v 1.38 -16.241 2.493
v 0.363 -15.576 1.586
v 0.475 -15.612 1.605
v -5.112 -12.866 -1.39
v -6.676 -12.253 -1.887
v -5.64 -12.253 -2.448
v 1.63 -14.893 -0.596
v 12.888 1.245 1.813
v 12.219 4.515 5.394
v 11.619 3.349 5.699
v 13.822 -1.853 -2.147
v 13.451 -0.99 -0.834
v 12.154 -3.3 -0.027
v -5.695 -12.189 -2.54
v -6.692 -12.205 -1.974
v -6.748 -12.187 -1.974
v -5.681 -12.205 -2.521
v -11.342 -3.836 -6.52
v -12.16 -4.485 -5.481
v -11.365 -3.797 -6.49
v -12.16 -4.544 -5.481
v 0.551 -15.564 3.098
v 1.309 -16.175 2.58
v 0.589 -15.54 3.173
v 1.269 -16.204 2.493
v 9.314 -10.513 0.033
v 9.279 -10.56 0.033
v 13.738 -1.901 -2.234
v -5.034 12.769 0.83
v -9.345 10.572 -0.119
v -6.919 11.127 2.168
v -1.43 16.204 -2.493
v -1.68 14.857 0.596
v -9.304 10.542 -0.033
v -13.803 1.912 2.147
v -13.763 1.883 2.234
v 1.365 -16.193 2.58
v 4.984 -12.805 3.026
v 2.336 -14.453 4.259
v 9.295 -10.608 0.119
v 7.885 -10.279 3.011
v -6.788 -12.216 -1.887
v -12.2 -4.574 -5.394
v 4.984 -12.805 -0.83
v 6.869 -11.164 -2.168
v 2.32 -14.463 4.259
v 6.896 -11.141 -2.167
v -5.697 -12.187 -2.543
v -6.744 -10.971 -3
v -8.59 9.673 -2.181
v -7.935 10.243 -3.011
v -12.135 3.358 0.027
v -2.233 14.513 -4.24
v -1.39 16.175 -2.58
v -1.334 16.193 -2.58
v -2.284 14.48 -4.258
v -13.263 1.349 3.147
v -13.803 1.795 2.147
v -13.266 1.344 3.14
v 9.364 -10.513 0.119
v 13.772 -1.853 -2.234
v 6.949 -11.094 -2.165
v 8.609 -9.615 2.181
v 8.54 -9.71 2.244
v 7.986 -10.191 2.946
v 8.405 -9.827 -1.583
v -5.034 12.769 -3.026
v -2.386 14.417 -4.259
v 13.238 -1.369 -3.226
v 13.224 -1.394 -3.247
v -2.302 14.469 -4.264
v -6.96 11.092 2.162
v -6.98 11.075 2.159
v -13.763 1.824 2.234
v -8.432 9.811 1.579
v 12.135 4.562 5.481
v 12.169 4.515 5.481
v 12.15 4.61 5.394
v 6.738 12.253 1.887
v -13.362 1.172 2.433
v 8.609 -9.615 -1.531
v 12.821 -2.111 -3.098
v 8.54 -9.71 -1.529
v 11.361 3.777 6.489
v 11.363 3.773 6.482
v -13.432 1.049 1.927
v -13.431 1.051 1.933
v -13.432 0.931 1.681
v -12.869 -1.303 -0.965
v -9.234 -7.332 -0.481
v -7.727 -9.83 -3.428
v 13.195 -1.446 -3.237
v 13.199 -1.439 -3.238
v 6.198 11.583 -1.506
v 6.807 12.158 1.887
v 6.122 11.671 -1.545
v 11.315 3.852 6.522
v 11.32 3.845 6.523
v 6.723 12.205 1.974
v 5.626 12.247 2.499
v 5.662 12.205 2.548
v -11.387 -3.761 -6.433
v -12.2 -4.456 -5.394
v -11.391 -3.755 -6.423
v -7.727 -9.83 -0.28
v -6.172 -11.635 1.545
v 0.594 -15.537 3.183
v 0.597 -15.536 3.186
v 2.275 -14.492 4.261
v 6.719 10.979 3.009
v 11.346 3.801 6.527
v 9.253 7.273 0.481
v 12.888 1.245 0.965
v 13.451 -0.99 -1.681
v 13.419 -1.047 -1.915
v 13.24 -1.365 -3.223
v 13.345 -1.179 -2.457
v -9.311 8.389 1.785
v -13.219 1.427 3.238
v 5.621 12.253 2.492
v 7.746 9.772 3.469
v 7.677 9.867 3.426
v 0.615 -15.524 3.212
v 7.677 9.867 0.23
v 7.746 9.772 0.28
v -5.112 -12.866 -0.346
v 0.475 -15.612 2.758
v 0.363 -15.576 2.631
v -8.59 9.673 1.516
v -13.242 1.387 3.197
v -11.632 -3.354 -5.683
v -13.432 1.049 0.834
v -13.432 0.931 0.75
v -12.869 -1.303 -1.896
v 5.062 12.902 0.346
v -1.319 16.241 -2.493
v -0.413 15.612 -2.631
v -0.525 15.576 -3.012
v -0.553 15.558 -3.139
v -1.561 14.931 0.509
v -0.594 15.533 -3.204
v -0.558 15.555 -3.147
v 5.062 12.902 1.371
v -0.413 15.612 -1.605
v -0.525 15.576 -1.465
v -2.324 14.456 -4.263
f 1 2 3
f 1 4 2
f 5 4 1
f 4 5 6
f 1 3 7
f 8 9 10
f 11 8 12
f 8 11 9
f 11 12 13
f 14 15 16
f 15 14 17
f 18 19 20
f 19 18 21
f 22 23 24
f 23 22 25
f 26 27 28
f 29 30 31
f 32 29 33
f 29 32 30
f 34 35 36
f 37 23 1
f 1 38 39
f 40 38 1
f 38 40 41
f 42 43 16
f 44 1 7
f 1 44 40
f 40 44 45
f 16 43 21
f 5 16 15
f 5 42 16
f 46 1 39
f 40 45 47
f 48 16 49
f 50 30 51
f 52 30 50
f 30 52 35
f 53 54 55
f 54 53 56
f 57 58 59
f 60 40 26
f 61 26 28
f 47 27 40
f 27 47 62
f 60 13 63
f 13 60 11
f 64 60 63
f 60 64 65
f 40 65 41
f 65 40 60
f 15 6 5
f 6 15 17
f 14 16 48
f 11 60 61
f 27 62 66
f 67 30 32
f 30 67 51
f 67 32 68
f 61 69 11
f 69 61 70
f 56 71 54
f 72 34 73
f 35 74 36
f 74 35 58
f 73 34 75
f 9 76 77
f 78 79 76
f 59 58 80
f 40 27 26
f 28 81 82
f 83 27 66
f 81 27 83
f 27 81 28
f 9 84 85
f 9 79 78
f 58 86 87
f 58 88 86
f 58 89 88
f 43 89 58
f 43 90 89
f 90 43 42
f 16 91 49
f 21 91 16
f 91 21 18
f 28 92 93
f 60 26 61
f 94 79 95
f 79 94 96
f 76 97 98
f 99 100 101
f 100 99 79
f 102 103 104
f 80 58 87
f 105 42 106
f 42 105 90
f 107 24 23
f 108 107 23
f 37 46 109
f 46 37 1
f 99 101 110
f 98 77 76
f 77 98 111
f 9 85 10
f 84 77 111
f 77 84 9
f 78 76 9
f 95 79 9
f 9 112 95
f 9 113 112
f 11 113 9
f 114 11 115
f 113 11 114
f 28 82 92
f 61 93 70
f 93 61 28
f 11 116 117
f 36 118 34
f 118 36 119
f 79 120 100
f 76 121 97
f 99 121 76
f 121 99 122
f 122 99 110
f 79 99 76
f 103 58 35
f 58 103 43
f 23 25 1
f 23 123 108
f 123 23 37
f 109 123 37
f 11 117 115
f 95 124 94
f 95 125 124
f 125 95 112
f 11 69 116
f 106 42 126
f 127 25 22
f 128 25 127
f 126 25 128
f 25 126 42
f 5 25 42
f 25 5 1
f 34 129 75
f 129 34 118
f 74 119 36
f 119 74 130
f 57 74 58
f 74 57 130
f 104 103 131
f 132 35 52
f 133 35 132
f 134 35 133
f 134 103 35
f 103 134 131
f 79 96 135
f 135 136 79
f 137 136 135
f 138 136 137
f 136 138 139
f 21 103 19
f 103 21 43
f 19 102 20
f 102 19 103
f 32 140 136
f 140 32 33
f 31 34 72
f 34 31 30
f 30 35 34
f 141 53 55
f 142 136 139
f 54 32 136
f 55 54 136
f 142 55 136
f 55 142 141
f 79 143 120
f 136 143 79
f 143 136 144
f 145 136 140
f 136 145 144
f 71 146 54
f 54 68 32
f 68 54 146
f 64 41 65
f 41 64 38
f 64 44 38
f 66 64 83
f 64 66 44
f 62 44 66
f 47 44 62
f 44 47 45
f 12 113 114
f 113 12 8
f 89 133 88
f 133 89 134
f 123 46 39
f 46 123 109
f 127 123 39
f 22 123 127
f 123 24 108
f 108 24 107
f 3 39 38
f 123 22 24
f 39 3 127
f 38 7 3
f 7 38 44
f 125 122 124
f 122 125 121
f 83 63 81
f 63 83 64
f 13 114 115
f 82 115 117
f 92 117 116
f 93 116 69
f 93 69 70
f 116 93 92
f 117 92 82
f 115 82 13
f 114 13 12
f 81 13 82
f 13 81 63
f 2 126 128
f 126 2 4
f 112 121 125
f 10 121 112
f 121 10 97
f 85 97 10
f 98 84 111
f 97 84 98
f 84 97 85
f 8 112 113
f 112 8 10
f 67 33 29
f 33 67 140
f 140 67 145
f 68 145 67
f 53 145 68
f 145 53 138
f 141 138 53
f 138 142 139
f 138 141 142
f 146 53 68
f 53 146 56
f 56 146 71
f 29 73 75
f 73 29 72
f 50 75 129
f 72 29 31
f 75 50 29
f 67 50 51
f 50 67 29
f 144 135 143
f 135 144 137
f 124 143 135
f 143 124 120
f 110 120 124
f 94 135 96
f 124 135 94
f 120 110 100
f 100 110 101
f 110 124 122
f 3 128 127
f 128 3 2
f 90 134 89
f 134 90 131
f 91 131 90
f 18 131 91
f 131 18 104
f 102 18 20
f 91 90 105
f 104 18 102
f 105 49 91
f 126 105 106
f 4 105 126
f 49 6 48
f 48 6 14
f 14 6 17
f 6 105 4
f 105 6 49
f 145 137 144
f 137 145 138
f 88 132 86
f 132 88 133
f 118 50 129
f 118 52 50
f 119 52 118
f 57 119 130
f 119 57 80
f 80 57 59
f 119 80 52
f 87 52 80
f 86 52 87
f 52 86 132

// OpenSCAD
// Auto-generated OpenSCAD file

    inner_points = 10*[[-1.3350698747901557, 0.0990218864340161, -0.41389441527673243], [0.8508637948042702, -0.9614534950051333, 0.5613942208431721], [-0.8508637948042702, 0.9614534950051333, -0.5613942208431721], [1.3350698747901557, -0.0990218864340161, 0.41389441527673243], [-0.07512626496626917, -0.194799963559733, -1.385617014211274], [0.7598260996660189, -0.5998655150369786, -1.013089904054999], [-0.7598260996660189, 0.5998655150369786, 1.013089904054999], [0.07512626496626917, 0.194799963559733, 1.385617014211274], [-0.5030679550992645, -1.280705233674586, -0.26503250471063], [0.7646000198631342, 0.9771700305368443, -0.6511920090175702], [-0.7646000198631342, -0.9771700305368443, 0.6511920090175702], [0.5030679550992645, 1.280705233674586, 0.26503250471063], [-0.8556377150013853, -0.6155820505686895, -0.9232921158806008], [0.4953435899607525, -1.2709918805305933, -0.3205305899169714], [-0.07217582002487244, 0.7798616050716232, -1.1619518146211012], [1.2788054849372654, 0.12445177510971961, -0.5591902886574719], [-1.2788054849372654, -0.12445177510971961, 0.5591902886574719], [0.07217582002487244, -0.7798616050716232, 1.1619518146211012], [-0.4953435899607525, 1.2709918805305933, 0.3205305899169714], [0.8556377150013853, 0.6155820505686895, 0.9232921158806008], [0.0443746617590165, -1.5516849543996245, 0.5267228692547999], [-0.0443746617590165, 1.5516849543996245, -0.5267228692547999]];

    outer_points = 10*[[0.6669622706403558, -0.020873051468661752, 1.2321733387908815], [-0.49050024063185305, 0.9496265660238541, -0.9061701775076568], [0.49050024063185305, -0.9496265660238541, 0.9061701775076568], [-0.6669622706403558, 0.020873051468661752, -1.2321733387908815], [1.372245669008736, -0.18534893390668453, -0.2147395821660355], [0.9301343304065605, 0.18534893390668453, -1.0315141257691125], [-0.9301343304065605, -0.18534893390668453, 1.0315141257691125], [-1.372245669008736, 0.18534893390668453, 0.2147395821660355], [0.6707072485223723, 1.215754134138207, 0.18873039942687714], [0.20872365623630781, -1.215754134138207, -0.6647569572525192], [-0.20872365623630781, 1.215754134138207, 0.6647569572525192], [-0.6707072485223723, -1.215754134138207, -0.18873039942687714], [1.2119109148021057, 0.4514765020210374, 0.5394130089910635], [0.4965597421320721, 1.0512782517001842, -0.782155963704398], [0.926389352524544, -1.0512782517001842, 0.011928813594892007], [0.21103817985451057, -0.4514765020210374, -1.3096401591005695], [-0.21103817985451057, 0.4514765020210374, 1.3096401591005695], [-0.926389352524544, 1.0512782517001842, -0.011928813594892007], [-0.4965597421320721, -1.0512782517001842, 0.782155963704398], [-1.2119109148021057, -0.4514765020210374, -0.5394130089910635], [-0.1349496014656266, 1.6145478368697694, -0.24931140534644022], [0.1349496014656266, -1.6145478368697694, 0.24931140534644022]];

    // Convex hull for inner set (I)
    module inner_hull() {
        hull() {
            for (p = inner_points) {
                translate(p) sphere(r=0.1);
            }
        }
    }

    // Convex hull for outer set (O) minus inner hull (O \ I)
    module outer_minus_inner() {
        difference() {
            hull() {
                for (p = outer_points) {
                    translate(p) sphere(r=0.1);
                }
            }
            inner_hull(); // Subtract inner hull
        }
    }

    // Convex hull for outer set (O) minus all translated inner hulls
    module outer_minus_AllTranslationInner() {
        difference() {
            hull() {
                for (p = outer_points) {
                    translate(p) sphere(r=0.1);
                }
            }
            hull() {
                translate([0,0,50]) inner_hull();
                translate([0,0,-50]) inner_hull();
            }; // Subtract translated inner hulls
        }
    }

    // Difference between outer_minus_inner and outer_minus_AllTranslationInner
    module outer_minus_inner_diff() {
        difference() {
            // Outer minus inner
            difference() {
                hull() {
                    for (p = outer_points) {
                        translate(p) sphere(r=0.1);
                    }
                }
                inner_hull();
            }

            // Subtract Outer minus AllTranslationInner
            difference() {
                hull() {
                    for (p = outer_points) {
                        translate(p) sphere(r=0.1);
                    }
                }
                hull() {
                    translate([0,0,50]) inner_hull();
                    translate([0,0,-50]) inner_hull();
                };
            }
        }
    }

    // Rendering all with colors applied
    color([0, 1, 0, 1]) outer_minus_AllTranslationInner(); // Opaque green
    
